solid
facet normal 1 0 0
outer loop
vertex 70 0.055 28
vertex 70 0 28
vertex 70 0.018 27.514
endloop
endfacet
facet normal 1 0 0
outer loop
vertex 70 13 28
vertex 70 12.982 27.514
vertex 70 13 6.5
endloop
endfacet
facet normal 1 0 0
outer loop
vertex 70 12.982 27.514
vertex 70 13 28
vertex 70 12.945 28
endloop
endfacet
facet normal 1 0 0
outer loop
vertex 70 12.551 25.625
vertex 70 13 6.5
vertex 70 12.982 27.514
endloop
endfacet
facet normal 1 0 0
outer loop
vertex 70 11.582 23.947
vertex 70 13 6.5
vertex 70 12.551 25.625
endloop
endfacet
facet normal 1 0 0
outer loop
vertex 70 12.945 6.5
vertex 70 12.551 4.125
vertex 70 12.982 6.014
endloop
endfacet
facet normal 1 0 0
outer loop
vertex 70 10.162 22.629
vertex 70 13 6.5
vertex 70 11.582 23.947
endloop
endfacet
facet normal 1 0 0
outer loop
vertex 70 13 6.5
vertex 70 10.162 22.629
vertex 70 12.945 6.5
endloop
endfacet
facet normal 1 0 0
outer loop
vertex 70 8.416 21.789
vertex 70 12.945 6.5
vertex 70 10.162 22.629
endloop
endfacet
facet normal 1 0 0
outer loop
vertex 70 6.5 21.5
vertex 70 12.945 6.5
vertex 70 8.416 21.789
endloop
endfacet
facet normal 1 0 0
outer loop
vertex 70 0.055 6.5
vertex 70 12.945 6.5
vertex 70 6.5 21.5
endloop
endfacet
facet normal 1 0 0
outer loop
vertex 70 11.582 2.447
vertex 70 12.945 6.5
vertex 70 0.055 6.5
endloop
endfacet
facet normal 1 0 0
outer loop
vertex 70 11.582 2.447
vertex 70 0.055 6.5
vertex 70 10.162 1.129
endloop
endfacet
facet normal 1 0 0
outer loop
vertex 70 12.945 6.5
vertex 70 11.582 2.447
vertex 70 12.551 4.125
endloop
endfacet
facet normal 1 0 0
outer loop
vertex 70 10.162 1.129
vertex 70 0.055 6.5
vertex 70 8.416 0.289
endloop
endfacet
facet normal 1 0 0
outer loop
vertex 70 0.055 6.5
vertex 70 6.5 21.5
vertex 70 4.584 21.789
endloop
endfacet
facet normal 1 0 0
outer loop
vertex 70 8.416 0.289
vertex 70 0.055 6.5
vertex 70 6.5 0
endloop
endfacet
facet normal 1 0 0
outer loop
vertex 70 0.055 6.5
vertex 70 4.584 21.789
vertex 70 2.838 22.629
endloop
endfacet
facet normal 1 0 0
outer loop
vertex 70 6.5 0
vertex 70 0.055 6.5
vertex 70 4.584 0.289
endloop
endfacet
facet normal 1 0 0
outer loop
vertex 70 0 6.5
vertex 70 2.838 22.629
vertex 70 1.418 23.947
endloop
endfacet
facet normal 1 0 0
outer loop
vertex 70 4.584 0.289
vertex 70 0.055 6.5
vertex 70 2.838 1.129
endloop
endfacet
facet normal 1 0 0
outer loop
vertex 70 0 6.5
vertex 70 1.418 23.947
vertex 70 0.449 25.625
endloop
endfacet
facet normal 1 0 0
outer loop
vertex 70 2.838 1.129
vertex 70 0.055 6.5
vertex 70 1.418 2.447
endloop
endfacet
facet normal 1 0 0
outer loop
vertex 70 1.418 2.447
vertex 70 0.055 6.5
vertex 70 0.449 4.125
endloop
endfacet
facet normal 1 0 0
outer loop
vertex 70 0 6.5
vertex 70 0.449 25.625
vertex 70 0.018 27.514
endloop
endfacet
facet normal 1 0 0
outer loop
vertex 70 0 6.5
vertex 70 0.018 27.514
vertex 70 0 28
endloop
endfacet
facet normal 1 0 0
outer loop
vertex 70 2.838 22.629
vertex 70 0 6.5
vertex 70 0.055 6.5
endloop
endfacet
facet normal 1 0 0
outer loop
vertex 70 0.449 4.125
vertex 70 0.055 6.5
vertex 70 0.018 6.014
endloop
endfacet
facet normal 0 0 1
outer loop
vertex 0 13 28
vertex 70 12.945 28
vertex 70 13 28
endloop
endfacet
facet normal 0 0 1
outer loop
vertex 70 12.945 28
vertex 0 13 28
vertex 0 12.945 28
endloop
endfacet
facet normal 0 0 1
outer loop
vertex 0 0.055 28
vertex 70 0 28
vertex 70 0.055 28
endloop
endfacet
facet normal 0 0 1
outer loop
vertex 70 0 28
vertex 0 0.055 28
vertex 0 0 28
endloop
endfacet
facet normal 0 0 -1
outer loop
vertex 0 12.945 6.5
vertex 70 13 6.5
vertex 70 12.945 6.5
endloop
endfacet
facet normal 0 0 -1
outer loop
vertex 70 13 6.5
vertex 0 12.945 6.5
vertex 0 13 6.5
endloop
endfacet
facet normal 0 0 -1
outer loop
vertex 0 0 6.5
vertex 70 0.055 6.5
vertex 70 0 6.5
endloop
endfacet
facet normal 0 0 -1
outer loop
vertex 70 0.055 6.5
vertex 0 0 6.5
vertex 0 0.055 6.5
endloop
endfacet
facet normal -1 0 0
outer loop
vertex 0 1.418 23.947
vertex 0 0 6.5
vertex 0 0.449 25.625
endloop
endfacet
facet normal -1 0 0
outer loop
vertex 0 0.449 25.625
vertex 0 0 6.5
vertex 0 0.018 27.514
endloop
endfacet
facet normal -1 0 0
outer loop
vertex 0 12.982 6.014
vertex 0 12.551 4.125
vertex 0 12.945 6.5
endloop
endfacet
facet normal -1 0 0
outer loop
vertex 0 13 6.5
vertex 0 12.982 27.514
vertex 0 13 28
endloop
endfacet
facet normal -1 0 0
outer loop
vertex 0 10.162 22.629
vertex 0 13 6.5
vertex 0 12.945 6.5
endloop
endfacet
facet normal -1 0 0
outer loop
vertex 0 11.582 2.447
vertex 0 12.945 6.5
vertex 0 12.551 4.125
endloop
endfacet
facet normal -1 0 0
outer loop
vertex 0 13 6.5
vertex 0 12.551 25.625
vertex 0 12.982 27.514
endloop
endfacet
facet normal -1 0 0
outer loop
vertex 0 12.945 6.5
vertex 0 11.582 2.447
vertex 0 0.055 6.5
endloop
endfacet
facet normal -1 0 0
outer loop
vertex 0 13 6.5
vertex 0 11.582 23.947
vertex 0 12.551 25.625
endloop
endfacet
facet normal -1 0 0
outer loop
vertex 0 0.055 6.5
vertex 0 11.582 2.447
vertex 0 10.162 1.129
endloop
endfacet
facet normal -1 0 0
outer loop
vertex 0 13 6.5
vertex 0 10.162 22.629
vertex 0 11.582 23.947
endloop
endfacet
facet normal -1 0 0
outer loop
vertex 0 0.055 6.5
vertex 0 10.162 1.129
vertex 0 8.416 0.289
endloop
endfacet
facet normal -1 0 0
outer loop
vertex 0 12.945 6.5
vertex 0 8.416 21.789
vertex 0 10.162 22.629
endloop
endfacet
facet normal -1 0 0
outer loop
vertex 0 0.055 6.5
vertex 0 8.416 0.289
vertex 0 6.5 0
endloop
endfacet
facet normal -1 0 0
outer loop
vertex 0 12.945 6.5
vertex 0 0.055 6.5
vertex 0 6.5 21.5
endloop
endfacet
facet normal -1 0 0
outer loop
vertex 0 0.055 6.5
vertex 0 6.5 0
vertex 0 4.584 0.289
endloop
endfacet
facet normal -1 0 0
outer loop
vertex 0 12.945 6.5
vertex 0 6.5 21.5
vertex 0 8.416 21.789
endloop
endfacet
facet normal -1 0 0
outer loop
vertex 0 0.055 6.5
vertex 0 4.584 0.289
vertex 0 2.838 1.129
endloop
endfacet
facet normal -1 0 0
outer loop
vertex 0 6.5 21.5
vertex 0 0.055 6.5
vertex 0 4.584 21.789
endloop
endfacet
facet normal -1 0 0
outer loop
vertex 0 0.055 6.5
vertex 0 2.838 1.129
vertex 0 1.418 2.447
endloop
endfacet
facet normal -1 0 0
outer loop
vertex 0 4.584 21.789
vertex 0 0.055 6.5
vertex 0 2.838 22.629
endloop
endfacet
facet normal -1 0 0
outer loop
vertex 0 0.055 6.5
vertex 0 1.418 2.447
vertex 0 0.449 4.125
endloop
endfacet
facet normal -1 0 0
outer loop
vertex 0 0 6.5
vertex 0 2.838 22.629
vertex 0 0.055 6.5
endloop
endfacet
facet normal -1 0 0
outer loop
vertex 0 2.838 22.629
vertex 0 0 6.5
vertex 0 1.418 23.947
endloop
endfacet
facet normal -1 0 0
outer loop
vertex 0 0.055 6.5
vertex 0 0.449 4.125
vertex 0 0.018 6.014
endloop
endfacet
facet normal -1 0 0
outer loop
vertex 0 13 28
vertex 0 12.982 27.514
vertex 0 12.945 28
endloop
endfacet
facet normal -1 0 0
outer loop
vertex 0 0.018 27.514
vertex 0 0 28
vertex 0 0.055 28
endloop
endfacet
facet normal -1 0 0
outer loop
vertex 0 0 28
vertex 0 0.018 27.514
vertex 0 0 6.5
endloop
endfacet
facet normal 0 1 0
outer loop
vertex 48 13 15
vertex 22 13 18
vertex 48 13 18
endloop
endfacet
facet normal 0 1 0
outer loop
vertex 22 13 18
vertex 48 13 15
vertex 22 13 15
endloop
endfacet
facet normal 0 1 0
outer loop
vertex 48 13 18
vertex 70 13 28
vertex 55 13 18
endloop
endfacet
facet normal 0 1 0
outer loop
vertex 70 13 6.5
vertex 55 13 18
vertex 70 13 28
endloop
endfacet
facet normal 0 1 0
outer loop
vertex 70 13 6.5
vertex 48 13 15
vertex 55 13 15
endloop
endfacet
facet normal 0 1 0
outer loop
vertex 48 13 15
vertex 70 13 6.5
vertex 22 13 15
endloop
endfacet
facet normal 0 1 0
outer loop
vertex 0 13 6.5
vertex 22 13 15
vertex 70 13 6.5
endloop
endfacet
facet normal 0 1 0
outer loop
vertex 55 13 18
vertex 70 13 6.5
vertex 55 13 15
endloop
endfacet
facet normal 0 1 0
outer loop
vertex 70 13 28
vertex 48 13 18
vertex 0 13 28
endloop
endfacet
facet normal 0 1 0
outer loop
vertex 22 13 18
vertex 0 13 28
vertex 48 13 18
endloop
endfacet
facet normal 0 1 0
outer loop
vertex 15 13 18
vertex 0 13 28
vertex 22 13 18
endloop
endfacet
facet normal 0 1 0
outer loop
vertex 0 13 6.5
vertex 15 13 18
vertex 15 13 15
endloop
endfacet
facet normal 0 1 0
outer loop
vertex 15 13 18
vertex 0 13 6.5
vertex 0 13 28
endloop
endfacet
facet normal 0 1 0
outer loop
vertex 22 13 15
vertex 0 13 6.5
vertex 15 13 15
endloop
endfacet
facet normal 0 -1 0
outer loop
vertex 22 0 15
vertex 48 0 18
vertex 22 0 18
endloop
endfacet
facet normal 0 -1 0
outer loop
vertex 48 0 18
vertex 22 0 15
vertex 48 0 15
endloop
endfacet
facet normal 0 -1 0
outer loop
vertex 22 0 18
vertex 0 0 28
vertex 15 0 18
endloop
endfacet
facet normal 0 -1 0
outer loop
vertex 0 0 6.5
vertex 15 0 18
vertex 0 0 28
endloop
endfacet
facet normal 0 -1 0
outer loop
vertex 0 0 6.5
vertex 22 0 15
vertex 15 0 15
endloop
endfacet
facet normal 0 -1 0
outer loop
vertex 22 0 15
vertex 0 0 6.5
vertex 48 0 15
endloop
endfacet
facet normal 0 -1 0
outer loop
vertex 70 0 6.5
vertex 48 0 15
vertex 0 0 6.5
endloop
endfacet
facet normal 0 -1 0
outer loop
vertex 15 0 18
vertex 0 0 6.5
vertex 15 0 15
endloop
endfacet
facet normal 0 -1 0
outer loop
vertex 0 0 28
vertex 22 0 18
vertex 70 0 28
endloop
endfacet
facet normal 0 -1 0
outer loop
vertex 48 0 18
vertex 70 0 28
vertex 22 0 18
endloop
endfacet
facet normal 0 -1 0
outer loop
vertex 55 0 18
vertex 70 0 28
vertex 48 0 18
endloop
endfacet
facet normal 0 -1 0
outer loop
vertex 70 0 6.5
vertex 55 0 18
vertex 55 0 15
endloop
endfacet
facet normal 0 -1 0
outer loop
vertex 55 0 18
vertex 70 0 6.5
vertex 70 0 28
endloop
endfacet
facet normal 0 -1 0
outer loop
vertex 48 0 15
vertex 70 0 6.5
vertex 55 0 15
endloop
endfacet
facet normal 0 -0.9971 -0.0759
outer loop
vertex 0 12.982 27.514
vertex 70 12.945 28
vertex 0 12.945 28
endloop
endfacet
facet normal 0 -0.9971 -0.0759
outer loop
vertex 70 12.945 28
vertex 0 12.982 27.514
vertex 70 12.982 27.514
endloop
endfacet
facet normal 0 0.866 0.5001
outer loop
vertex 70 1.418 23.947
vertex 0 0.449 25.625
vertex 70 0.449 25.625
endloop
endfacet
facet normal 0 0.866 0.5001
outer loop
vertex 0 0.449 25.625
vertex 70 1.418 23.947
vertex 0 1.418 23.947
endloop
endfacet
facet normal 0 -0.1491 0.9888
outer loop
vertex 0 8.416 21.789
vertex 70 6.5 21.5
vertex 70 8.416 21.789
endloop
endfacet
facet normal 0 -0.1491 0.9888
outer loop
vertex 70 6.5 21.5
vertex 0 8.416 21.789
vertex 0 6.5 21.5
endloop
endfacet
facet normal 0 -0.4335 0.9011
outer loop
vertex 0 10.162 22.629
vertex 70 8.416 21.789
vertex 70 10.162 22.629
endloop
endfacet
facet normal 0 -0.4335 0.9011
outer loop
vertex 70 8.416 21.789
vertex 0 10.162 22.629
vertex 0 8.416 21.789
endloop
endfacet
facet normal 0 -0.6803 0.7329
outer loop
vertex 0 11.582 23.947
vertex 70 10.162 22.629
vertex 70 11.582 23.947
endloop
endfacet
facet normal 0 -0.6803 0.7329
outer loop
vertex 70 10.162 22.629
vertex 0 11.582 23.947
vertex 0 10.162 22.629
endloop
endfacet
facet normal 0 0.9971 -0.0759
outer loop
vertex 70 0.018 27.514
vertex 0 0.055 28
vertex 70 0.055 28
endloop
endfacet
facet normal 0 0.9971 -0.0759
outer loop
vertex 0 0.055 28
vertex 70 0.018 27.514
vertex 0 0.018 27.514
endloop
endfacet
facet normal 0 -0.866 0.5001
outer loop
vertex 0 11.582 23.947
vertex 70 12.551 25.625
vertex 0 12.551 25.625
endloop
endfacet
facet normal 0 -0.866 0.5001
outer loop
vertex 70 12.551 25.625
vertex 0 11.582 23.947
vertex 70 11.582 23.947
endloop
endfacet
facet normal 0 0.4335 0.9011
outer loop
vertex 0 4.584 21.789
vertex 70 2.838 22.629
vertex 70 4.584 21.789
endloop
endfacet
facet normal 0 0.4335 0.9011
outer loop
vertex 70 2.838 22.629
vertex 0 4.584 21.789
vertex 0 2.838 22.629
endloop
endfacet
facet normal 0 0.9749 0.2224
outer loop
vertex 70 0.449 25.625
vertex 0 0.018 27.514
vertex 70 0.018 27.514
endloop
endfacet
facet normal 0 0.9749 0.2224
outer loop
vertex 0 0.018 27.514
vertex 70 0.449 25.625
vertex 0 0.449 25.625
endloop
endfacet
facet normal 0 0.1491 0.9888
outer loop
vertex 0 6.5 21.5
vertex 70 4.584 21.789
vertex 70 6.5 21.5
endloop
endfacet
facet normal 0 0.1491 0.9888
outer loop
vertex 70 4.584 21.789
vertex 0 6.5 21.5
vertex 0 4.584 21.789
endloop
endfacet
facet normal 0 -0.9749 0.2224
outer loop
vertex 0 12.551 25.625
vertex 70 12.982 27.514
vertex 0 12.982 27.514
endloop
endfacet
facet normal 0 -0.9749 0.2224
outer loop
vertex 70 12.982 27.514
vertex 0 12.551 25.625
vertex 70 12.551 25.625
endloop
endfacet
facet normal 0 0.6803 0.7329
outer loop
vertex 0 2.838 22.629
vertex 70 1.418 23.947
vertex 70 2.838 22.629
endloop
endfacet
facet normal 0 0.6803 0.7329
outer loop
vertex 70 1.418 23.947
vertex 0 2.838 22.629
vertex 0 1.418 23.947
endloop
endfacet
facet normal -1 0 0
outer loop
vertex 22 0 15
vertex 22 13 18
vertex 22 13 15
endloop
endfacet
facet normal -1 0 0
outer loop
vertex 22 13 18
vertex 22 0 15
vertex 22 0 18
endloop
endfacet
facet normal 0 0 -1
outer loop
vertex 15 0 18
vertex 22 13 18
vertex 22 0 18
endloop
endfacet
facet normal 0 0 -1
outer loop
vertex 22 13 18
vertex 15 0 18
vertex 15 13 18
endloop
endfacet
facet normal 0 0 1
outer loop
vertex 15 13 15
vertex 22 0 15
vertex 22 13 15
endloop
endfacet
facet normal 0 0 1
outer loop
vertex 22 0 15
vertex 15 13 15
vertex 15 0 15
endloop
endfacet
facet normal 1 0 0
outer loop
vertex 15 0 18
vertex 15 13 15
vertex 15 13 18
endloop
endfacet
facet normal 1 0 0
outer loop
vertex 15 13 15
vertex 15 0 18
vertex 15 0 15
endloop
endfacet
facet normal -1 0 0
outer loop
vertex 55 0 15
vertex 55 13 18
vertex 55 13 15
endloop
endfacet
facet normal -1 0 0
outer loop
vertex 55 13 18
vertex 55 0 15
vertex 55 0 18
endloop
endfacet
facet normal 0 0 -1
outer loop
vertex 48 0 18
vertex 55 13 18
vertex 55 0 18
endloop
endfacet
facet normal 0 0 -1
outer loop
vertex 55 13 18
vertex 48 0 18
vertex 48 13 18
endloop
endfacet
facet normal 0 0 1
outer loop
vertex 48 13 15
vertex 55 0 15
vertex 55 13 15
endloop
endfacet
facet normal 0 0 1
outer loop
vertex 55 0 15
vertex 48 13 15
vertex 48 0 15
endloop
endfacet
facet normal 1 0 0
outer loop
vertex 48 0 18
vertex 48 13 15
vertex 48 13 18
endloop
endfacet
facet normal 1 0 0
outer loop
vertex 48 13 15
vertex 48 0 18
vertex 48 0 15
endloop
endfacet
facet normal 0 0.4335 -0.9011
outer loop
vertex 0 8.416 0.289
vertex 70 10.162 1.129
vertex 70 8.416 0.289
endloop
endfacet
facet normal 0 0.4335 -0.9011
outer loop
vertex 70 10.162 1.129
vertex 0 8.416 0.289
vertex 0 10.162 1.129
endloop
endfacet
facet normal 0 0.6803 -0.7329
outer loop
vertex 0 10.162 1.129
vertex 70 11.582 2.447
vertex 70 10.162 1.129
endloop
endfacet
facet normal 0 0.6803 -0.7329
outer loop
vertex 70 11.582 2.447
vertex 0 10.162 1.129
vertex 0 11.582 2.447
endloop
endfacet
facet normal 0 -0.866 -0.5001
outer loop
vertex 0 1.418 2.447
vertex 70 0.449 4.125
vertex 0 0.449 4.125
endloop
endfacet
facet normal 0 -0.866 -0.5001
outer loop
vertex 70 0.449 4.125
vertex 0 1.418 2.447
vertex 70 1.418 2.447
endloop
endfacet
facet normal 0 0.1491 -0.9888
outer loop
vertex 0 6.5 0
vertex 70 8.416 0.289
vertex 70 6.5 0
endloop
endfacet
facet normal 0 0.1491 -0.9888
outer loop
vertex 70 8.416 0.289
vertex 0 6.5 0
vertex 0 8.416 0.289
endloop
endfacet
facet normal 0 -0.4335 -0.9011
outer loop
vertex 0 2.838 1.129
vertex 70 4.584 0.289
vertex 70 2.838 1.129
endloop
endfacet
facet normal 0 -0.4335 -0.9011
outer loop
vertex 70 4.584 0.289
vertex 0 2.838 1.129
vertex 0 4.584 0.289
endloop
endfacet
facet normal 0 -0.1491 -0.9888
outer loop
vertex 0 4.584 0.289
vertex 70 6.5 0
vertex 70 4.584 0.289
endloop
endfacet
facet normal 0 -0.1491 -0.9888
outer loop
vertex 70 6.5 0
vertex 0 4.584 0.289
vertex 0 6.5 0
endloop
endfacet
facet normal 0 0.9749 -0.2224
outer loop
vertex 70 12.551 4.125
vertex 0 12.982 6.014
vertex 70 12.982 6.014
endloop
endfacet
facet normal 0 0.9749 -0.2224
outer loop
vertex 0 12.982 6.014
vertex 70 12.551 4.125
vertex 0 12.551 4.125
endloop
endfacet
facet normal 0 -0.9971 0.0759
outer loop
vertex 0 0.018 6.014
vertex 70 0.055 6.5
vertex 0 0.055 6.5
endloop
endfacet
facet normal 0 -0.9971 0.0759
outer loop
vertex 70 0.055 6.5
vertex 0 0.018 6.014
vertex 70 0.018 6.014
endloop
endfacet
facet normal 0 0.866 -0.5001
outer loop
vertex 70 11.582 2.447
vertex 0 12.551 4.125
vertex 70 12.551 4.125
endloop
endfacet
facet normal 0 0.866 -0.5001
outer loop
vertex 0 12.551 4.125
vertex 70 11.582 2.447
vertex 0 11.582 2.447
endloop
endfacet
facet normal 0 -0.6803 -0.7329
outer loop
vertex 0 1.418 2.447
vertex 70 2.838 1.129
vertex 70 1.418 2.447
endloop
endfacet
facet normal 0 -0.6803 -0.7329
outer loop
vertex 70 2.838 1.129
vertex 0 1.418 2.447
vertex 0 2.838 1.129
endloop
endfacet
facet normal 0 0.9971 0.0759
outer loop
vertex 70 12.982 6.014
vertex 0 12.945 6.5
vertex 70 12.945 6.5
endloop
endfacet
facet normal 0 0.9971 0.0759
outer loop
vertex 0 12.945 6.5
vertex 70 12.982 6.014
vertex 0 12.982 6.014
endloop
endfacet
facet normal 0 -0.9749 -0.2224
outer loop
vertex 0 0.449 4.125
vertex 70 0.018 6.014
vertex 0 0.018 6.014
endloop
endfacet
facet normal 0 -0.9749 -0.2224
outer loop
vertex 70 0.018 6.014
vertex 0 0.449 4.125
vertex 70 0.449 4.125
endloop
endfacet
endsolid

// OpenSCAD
union() {
	difference() {
	
		translate( [ 0, 0, 6.5 ] )
		cube( [ 70, 13, 15+6.5 ] );
		
		translate( [ -1, 13/2, 15+13 ] )
		rotate( 90, [0,1,0] )
		cylinder( r=13/2, h=72 );

		translate( [ 15, -1, 15 ] )
		cube( [ 7, 15, 3 ] );
		
		translate( [ 70-15-7, -1, 15 ] )
		cube( [ 7, 15, 3 ] );

	}

	translate( [ 0, 13/2, 6.5 ] )
	rotate( 90, [0,1,0] )
	cylinder( r=13/2, h=70 );
}
